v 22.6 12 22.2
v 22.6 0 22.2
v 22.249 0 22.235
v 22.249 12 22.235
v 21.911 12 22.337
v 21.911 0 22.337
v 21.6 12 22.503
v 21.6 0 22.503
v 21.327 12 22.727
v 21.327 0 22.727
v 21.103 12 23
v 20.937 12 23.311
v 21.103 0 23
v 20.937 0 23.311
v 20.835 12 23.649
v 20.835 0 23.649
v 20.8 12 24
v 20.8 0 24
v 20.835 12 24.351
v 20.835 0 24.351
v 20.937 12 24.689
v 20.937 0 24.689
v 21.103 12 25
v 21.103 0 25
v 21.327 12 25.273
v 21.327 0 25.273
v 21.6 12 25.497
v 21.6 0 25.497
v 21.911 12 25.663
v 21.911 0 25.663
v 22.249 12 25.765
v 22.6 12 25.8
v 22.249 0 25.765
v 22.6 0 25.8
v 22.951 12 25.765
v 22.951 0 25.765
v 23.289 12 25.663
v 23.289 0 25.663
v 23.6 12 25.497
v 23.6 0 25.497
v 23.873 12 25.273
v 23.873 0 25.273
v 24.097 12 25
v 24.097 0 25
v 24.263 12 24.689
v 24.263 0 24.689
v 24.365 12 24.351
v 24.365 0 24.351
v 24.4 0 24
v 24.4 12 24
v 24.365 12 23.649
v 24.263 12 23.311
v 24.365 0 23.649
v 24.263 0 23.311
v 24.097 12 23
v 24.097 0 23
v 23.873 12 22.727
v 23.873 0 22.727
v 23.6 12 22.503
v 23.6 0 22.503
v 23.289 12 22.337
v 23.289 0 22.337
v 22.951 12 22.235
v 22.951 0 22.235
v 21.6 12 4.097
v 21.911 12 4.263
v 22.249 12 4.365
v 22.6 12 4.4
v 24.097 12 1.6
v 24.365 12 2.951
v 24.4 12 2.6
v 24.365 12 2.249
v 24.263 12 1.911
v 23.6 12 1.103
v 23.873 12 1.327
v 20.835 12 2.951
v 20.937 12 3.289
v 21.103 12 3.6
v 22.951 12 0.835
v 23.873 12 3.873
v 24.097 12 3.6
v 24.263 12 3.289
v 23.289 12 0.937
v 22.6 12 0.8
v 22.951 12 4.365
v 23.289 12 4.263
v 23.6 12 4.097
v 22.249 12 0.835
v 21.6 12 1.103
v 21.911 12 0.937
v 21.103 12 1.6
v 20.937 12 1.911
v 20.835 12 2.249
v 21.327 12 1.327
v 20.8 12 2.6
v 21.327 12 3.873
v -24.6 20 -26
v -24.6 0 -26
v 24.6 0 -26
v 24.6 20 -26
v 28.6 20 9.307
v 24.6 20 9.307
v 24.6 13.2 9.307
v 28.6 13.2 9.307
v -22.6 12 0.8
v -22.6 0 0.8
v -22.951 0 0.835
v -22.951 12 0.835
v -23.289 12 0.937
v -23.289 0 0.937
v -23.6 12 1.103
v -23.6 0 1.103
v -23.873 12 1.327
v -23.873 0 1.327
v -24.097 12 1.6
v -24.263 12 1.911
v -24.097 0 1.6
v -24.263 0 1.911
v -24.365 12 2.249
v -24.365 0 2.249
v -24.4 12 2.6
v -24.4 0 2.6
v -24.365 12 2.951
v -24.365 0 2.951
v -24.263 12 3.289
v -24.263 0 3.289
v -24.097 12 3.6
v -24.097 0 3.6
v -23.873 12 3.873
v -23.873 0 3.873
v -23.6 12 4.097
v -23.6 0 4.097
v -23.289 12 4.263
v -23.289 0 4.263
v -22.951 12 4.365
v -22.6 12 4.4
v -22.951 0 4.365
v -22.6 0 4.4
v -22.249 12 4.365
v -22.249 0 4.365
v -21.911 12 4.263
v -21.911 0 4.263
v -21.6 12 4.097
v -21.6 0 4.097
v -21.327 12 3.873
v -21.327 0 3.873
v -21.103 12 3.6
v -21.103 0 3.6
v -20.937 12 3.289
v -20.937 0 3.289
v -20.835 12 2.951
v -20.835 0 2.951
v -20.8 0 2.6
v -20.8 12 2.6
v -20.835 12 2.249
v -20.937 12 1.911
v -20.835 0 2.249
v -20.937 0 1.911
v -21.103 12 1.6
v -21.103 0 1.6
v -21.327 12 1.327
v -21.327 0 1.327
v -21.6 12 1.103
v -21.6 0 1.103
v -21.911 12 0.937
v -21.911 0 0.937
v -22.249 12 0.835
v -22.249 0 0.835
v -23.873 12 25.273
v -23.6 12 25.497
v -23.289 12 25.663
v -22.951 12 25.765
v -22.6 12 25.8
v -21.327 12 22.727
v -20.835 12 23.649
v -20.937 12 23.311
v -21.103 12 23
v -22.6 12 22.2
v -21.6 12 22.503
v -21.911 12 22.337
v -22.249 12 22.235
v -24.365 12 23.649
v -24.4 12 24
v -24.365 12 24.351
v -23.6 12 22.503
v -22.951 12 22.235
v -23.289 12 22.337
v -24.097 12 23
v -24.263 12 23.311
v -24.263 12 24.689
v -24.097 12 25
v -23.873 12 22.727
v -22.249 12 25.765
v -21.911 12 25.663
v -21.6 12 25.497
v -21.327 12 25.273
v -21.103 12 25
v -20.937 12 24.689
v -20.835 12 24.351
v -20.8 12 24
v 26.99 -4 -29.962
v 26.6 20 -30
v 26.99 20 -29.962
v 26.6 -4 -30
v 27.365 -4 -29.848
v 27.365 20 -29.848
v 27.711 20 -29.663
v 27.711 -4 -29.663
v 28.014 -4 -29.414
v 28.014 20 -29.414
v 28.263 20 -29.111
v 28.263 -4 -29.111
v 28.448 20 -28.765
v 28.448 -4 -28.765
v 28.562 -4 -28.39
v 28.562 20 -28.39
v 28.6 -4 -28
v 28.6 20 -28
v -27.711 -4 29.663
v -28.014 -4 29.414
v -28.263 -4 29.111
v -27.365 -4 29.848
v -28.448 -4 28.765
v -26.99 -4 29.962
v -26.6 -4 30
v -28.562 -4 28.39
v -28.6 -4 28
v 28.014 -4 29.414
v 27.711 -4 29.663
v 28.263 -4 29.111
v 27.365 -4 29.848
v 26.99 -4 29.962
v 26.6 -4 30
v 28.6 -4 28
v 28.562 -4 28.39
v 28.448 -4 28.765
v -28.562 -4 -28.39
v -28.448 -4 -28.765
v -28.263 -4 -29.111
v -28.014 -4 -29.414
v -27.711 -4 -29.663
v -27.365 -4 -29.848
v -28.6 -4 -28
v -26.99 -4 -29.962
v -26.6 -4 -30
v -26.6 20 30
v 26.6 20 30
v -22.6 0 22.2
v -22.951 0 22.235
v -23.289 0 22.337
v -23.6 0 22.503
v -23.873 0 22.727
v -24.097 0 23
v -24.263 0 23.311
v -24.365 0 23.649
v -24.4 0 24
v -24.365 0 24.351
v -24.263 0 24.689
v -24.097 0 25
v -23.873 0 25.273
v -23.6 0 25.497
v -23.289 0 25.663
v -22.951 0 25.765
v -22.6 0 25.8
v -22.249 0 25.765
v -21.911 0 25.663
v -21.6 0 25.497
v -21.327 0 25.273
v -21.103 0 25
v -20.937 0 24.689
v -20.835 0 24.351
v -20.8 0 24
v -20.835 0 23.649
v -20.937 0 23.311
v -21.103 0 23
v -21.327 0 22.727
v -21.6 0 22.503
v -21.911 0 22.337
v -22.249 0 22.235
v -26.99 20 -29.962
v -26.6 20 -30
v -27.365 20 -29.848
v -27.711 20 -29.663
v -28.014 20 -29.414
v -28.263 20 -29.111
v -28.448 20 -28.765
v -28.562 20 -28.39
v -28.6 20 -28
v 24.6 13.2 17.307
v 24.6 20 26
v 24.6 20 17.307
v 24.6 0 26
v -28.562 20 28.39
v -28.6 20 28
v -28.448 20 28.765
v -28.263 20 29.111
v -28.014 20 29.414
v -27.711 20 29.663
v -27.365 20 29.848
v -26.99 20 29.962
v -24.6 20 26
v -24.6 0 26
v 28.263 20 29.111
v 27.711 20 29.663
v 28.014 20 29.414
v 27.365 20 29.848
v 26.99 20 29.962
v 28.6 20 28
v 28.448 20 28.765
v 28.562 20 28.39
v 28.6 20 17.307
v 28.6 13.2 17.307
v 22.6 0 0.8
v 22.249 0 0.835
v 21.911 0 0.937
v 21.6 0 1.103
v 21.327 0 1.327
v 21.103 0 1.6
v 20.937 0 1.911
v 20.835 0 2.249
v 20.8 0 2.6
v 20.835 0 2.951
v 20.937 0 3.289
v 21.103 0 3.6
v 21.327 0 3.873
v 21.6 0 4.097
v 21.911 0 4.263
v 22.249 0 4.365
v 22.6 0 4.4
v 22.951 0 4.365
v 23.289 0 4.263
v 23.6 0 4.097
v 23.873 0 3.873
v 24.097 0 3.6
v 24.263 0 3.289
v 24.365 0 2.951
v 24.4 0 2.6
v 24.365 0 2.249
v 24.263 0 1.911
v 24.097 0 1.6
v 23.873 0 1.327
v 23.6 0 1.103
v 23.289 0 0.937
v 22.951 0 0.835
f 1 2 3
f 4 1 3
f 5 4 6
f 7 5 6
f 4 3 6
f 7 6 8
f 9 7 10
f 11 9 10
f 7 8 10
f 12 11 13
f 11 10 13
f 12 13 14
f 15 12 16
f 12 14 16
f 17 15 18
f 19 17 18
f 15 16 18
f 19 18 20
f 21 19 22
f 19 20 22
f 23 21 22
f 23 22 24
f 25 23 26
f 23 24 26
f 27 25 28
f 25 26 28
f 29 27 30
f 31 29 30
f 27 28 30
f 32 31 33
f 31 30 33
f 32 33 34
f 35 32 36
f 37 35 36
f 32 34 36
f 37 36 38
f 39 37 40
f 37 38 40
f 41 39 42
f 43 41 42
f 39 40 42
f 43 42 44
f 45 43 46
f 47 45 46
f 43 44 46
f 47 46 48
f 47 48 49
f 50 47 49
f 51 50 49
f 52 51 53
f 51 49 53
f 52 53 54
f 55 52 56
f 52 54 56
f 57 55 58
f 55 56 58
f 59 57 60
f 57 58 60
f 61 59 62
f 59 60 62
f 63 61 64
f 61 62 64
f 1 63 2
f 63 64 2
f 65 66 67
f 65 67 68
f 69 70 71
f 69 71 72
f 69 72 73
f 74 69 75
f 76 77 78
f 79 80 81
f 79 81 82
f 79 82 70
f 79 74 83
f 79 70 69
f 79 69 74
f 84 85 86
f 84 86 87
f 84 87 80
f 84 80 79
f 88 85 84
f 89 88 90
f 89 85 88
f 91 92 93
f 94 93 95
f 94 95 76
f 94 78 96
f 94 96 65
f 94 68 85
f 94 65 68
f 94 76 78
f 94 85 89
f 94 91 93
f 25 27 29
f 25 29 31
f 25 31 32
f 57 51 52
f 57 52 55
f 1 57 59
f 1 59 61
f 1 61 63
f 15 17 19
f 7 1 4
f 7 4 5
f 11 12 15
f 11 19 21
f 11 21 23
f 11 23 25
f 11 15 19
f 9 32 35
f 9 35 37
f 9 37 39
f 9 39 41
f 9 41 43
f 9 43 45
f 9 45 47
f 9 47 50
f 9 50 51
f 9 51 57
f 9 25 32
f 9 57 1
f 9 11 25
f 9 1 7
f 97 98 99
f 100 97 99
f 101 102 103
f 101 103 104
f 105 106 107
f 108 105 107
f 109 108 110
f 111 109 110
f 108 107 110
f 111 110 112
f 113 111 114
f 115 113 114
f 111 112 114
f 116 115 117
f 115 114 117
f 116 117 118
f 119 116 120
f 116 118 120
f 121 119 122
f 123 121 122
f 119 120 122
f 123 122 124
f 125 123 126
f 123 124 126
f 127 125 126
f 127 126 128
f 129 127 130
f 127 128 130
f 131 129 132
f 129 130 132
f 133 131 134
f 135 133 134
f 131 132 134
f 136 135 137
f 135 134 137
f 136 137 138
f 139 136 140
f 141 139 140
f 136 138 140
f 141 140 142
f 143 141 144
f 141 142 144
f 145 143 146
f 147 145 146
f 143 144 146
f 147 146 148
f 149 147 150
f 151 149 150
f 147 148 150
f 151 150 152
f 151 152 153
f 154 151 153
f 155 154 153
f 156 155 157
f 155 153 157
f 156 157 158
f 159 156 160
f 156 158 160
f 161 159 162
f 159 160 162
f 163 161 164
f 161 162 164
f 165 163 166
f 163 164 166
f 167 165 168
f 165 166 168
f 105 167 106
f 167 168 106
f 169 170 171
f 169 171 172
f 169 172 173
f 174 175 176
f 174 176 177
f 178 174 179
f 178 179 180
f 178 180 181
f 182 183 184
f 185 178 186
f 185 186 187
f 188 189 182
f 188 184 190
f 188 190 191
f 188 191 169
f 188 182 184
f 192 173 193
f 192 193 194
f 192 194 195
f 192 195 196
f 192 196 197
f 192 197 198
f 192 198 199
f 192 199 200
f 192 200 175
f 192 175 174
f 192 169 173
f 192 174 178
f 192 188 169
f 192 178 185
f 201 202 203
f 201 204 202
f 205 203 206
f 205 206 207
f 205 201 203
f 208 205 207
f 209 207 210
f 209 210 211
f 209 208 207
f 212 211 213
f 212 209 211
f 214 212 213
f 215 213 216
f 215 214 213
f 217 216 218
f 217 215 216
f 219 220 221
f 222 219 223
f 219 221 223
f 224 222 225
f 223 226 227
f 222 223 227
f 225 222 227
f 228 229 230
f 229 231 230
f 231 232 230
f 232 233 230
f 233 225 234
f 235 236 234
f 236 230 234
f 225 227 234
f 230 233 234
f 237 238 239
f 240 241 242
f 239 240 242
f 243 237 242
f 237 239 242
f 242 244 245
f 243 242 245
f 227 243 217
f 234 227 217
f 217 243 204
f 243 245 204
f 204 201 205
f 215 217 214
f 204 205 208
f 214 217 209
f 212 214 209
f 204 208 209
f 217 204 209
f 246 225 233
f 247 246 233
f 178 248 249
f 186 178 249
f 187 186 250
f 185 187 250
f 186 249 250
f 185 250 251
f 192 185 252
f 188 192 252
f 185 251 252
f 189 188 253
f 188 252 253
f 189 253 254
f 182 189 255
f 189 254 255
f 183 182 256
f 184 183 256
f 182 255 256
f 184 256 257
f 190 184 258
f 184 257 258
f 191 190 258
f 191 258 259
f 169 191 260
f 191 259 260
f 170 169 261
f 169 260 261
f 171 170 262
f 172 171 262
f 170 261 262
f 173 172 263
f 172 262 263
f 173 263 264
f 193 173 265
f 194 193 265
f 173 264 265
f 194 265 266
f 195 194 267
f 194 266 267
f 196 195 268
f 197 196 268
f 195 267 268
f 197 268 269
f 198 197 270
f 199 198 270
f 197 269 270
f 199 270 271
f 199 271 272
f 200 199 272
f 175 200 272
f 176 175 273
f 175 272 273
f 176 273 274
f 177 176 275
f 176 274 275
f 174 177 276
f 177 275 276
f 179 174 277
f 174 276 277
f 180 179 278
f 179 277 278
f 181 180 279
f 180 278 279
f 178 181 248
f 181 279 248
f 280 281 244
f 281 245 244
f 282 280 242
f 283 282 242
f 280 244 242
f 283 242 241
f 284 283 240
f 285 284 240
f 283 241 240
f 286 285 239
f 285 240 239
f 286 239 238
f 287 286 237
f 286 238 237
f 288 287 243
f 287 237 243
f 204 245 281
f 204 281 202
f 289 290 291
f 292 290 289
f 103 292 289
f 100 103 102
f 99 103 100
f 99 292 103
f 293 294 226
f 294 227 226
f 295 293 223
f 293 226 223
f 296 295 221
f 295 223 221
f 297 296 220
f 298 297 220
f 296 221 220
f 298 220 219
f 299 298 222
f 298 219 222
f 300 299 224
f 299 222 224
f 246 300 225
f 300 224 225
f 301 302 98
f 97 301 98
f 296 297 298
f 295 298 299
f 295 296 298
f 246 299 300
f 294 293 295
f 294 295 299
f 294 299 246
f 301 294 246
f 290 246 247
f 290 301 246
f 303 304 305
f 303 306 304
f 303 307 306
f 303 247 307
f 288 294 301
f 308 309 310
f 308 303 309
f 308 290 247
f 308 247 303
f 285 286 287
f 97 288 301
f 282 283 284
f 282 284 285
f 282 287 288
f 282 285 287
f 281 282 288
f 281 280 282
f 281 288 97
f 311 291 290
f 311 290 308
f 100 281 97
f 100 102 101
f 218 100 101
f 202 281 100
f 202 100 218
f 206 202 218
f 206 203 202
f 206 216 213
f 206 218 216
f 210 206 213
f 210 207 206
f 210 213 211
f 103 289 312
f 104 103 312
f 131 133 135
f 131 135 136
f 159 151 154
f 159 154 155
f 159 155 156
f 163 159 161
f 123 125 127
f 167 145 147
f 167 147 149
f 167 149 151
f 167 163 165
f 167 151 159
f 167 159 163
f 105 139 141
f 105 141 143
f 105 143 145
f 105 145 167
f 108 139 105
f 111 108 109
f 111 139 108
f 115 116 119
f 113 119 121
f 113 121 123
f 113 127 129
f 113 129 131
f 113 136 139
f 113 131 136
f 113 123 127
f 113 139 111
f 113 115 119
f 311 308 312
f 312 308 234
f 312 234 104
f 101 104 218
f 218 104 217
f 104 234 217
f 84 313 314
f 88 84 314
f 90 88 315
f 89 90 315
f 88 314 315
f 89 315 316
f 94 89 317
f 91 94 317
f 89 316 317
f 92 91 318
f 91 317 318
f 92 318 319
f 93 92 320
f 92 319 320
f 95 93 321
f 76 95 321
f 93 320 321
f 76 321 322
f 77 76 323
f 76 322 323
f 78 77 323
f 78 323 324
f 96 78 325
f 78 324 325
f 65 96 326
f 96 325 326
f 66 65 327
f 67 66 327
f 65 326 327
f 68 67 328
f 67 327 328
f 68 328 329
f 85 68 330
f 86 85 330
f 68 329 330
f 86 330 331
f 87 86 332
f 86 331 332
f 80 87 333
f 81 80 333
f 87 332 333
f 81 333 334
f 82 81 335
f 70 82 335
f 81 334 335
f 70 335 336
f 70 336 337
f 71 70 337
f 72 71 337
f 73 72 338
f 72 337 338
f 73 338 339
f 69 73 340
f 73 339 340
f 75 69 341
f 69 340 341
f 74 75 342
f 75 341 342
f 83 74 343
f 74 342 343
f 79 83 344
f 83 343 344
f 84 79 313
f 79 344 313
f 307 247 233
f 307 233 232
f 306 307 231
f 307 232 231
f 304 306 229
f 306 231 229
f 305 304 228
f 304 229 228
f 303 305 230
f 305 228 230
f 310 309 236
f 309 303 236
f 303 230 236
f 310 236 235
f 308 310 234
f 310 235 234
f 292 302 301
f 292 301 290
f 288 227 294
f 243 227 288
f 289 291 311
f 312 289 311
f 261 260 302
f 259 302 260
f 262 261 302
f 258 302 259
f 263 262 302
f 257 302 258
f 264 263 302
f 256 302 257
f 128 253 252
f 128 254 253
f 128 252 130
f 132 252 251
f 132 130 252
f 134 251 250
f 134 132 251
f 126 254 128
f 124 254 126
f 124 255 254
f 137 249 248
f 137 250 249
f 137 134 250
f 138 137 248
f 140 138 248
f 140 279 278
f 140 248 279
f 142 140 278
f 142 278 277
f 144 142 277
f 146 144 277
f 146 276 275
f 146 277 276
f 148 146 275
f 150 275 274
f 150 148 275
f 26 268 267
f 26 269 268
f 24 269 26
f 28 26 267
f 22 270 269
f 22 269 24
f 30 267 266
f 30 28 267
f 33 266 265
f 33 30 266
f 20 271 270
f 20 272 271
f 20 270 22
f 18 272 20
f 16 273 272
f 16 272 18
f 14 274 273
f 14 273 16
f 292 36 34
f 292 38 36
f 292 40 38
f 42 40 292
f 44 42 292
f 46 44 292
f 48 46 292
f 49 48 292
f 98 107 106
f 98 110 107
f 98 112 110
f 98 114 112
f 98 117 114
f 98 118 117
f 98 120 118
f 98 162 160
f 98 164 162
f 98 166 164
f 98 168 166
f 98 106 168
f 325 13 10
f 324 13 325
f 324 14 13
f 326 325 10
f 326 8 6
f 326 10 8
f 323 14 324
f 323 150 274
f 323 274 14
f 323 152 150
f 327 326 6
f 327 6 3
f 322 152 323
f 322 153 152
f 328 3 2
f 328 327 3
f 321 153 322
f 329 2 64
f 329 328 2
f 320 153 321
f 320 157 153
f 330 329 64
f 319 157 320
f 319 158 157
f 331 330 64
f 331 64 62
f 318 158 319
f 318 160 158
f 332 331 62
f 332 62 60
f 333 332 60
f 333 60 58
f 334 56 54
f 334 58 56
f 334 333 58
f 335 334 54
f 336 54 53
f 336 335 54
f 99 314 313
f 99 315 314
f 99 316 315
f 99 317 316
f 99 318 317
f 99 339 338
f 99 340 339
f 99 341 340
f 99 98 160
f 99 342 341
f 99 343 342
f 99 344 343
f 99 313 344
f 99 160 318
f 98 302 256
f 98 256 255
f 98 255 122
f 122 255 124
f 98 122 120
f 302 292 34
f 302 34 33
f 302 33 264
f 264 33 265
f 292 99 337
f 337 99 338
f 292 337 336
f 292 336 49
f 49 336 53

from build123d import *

# Parameters (mm, degrees)
ESQUISSE1_W          = 49.2
ESQUISSE1_H          = 52
BOSS_EXTRU_1_DEPTH   = 20
COQUE1_T             = 4
CONG_1_R             = 2
CONG_2_R             = 2
CONG_3_R             = 2
CONG_4_R             = 2
ESQUISSE5_R          = 1.8
BOSS_EXTRU_2_DEPTH   = 12
EMPREINTE1_START     = 9.306734089
EMPREINTE1_OUTLINE_W = 4
EMPREINTE1_OUTLINE_H = 6.8
EMPREINTE1_DEPTH     = 8


# Read off the part's stored shape, not the designer's step: Empreinte1
with BuildPart() as part:
    # Esquisse1 → Boss.-Extru.1 (new body)
    with BuildSketch(Plane(origin=(0, 0, 0), x_dir=(1, 0, 0), z_dir=(0, 1, 0))):
        Rectangle(ESQUISSE1_W, ESQUISSE1_H)
    extrude(amount=BOSS_EXTRU_1_DEPTH)

    # Coque1
    coque1_openings = [part.faces().sort_by_distance(p)[0] for p in [
        (0, 20, 0),
    ]]
    offset(amount=COQUE1_T, openings=coque1_openings, kind=Kind.INTERSECTION)

    # Congé1
    # the kernel refuses this fillet: 2 mm, written as the material it takes off along each edge
    with BuildSketch(Plane(origin=(28.6, -9, 30), x_dir=(-1, 0, 0), z_dir=(0, 1, 0))) as cong_1_piece_1:
        with BuildLine():
            CenterArc((CONG_1_R, -CONG_1_R), CONG_1_R, 90, 90)
            Line((0, -CONG_1_R), (0, 0))
            Line((0, 0), (CONG_1_R, 0))
        make_face()
    extrude(amount=34, mode=Mode.SUBTRACT)

    # Congé2
    cong_2_edges = [part.edges().sort_by_distance(p)[0] for p in [
        (28.6, 8, -30),
    ]]
    fillet(cong_2_edges, radius=CONG_2_R)

    # Congé3
    cong_3_edges = [part.edges().sort_by_distance(p)[0] for p in [
        (-28.6, 8, -30),
    ]]
    fillet(cong_3_edges, radius=CONG_3_R)

    # Congé4
    cong_4_edges = [part.edges().sort_by_distance(p)[0] for p in [
        (-28.6, 8, 30),
    ]]
    fillet(cong_4_edges, radius=CONG_4_R)

    # Esquisse5 → Boss.-Extru.2 (add)
    with BuildSketch(Plane(origin=(0, 0, 0), x_dir=(1, 0, 0), z_dir=(0, 1, 0))):
        with Locations(Location((-22.6, -2.6, 0), (0, 0, 90))):
            Circle(ESQUISSE5_R)
        with Locations(Location((22.6, -2.6, 0), (0, 0, 90))):
            Circle(ESQUISSE5_R)
        with Locations(Location((-22.6, -24, 0), (0, 0, 90))):
            Circle(ESQUISSE5_R)
        with Locations(Location((22.6, -24, 0), (0, 0, 90))):
            Circle(ESQUISSE5_R)
    extrude(amount=BOSS_EXTRU_2_DEPTH)

    # Empreinte1 outline → Empreinte1 (cut)
    with BuildSketch(Plane.XY.offset(EMPREINTE1_START)):
        with Locations((26.6, 16.6)):
            Rectangle(EMPREINTE1_OUTLINE_W, EMPREINTE1_OUTLINE_H)
    extrude(amount=EMPREINTE1_DEPTH, mode=Mode.SUBTRACT)


solid = part.part
